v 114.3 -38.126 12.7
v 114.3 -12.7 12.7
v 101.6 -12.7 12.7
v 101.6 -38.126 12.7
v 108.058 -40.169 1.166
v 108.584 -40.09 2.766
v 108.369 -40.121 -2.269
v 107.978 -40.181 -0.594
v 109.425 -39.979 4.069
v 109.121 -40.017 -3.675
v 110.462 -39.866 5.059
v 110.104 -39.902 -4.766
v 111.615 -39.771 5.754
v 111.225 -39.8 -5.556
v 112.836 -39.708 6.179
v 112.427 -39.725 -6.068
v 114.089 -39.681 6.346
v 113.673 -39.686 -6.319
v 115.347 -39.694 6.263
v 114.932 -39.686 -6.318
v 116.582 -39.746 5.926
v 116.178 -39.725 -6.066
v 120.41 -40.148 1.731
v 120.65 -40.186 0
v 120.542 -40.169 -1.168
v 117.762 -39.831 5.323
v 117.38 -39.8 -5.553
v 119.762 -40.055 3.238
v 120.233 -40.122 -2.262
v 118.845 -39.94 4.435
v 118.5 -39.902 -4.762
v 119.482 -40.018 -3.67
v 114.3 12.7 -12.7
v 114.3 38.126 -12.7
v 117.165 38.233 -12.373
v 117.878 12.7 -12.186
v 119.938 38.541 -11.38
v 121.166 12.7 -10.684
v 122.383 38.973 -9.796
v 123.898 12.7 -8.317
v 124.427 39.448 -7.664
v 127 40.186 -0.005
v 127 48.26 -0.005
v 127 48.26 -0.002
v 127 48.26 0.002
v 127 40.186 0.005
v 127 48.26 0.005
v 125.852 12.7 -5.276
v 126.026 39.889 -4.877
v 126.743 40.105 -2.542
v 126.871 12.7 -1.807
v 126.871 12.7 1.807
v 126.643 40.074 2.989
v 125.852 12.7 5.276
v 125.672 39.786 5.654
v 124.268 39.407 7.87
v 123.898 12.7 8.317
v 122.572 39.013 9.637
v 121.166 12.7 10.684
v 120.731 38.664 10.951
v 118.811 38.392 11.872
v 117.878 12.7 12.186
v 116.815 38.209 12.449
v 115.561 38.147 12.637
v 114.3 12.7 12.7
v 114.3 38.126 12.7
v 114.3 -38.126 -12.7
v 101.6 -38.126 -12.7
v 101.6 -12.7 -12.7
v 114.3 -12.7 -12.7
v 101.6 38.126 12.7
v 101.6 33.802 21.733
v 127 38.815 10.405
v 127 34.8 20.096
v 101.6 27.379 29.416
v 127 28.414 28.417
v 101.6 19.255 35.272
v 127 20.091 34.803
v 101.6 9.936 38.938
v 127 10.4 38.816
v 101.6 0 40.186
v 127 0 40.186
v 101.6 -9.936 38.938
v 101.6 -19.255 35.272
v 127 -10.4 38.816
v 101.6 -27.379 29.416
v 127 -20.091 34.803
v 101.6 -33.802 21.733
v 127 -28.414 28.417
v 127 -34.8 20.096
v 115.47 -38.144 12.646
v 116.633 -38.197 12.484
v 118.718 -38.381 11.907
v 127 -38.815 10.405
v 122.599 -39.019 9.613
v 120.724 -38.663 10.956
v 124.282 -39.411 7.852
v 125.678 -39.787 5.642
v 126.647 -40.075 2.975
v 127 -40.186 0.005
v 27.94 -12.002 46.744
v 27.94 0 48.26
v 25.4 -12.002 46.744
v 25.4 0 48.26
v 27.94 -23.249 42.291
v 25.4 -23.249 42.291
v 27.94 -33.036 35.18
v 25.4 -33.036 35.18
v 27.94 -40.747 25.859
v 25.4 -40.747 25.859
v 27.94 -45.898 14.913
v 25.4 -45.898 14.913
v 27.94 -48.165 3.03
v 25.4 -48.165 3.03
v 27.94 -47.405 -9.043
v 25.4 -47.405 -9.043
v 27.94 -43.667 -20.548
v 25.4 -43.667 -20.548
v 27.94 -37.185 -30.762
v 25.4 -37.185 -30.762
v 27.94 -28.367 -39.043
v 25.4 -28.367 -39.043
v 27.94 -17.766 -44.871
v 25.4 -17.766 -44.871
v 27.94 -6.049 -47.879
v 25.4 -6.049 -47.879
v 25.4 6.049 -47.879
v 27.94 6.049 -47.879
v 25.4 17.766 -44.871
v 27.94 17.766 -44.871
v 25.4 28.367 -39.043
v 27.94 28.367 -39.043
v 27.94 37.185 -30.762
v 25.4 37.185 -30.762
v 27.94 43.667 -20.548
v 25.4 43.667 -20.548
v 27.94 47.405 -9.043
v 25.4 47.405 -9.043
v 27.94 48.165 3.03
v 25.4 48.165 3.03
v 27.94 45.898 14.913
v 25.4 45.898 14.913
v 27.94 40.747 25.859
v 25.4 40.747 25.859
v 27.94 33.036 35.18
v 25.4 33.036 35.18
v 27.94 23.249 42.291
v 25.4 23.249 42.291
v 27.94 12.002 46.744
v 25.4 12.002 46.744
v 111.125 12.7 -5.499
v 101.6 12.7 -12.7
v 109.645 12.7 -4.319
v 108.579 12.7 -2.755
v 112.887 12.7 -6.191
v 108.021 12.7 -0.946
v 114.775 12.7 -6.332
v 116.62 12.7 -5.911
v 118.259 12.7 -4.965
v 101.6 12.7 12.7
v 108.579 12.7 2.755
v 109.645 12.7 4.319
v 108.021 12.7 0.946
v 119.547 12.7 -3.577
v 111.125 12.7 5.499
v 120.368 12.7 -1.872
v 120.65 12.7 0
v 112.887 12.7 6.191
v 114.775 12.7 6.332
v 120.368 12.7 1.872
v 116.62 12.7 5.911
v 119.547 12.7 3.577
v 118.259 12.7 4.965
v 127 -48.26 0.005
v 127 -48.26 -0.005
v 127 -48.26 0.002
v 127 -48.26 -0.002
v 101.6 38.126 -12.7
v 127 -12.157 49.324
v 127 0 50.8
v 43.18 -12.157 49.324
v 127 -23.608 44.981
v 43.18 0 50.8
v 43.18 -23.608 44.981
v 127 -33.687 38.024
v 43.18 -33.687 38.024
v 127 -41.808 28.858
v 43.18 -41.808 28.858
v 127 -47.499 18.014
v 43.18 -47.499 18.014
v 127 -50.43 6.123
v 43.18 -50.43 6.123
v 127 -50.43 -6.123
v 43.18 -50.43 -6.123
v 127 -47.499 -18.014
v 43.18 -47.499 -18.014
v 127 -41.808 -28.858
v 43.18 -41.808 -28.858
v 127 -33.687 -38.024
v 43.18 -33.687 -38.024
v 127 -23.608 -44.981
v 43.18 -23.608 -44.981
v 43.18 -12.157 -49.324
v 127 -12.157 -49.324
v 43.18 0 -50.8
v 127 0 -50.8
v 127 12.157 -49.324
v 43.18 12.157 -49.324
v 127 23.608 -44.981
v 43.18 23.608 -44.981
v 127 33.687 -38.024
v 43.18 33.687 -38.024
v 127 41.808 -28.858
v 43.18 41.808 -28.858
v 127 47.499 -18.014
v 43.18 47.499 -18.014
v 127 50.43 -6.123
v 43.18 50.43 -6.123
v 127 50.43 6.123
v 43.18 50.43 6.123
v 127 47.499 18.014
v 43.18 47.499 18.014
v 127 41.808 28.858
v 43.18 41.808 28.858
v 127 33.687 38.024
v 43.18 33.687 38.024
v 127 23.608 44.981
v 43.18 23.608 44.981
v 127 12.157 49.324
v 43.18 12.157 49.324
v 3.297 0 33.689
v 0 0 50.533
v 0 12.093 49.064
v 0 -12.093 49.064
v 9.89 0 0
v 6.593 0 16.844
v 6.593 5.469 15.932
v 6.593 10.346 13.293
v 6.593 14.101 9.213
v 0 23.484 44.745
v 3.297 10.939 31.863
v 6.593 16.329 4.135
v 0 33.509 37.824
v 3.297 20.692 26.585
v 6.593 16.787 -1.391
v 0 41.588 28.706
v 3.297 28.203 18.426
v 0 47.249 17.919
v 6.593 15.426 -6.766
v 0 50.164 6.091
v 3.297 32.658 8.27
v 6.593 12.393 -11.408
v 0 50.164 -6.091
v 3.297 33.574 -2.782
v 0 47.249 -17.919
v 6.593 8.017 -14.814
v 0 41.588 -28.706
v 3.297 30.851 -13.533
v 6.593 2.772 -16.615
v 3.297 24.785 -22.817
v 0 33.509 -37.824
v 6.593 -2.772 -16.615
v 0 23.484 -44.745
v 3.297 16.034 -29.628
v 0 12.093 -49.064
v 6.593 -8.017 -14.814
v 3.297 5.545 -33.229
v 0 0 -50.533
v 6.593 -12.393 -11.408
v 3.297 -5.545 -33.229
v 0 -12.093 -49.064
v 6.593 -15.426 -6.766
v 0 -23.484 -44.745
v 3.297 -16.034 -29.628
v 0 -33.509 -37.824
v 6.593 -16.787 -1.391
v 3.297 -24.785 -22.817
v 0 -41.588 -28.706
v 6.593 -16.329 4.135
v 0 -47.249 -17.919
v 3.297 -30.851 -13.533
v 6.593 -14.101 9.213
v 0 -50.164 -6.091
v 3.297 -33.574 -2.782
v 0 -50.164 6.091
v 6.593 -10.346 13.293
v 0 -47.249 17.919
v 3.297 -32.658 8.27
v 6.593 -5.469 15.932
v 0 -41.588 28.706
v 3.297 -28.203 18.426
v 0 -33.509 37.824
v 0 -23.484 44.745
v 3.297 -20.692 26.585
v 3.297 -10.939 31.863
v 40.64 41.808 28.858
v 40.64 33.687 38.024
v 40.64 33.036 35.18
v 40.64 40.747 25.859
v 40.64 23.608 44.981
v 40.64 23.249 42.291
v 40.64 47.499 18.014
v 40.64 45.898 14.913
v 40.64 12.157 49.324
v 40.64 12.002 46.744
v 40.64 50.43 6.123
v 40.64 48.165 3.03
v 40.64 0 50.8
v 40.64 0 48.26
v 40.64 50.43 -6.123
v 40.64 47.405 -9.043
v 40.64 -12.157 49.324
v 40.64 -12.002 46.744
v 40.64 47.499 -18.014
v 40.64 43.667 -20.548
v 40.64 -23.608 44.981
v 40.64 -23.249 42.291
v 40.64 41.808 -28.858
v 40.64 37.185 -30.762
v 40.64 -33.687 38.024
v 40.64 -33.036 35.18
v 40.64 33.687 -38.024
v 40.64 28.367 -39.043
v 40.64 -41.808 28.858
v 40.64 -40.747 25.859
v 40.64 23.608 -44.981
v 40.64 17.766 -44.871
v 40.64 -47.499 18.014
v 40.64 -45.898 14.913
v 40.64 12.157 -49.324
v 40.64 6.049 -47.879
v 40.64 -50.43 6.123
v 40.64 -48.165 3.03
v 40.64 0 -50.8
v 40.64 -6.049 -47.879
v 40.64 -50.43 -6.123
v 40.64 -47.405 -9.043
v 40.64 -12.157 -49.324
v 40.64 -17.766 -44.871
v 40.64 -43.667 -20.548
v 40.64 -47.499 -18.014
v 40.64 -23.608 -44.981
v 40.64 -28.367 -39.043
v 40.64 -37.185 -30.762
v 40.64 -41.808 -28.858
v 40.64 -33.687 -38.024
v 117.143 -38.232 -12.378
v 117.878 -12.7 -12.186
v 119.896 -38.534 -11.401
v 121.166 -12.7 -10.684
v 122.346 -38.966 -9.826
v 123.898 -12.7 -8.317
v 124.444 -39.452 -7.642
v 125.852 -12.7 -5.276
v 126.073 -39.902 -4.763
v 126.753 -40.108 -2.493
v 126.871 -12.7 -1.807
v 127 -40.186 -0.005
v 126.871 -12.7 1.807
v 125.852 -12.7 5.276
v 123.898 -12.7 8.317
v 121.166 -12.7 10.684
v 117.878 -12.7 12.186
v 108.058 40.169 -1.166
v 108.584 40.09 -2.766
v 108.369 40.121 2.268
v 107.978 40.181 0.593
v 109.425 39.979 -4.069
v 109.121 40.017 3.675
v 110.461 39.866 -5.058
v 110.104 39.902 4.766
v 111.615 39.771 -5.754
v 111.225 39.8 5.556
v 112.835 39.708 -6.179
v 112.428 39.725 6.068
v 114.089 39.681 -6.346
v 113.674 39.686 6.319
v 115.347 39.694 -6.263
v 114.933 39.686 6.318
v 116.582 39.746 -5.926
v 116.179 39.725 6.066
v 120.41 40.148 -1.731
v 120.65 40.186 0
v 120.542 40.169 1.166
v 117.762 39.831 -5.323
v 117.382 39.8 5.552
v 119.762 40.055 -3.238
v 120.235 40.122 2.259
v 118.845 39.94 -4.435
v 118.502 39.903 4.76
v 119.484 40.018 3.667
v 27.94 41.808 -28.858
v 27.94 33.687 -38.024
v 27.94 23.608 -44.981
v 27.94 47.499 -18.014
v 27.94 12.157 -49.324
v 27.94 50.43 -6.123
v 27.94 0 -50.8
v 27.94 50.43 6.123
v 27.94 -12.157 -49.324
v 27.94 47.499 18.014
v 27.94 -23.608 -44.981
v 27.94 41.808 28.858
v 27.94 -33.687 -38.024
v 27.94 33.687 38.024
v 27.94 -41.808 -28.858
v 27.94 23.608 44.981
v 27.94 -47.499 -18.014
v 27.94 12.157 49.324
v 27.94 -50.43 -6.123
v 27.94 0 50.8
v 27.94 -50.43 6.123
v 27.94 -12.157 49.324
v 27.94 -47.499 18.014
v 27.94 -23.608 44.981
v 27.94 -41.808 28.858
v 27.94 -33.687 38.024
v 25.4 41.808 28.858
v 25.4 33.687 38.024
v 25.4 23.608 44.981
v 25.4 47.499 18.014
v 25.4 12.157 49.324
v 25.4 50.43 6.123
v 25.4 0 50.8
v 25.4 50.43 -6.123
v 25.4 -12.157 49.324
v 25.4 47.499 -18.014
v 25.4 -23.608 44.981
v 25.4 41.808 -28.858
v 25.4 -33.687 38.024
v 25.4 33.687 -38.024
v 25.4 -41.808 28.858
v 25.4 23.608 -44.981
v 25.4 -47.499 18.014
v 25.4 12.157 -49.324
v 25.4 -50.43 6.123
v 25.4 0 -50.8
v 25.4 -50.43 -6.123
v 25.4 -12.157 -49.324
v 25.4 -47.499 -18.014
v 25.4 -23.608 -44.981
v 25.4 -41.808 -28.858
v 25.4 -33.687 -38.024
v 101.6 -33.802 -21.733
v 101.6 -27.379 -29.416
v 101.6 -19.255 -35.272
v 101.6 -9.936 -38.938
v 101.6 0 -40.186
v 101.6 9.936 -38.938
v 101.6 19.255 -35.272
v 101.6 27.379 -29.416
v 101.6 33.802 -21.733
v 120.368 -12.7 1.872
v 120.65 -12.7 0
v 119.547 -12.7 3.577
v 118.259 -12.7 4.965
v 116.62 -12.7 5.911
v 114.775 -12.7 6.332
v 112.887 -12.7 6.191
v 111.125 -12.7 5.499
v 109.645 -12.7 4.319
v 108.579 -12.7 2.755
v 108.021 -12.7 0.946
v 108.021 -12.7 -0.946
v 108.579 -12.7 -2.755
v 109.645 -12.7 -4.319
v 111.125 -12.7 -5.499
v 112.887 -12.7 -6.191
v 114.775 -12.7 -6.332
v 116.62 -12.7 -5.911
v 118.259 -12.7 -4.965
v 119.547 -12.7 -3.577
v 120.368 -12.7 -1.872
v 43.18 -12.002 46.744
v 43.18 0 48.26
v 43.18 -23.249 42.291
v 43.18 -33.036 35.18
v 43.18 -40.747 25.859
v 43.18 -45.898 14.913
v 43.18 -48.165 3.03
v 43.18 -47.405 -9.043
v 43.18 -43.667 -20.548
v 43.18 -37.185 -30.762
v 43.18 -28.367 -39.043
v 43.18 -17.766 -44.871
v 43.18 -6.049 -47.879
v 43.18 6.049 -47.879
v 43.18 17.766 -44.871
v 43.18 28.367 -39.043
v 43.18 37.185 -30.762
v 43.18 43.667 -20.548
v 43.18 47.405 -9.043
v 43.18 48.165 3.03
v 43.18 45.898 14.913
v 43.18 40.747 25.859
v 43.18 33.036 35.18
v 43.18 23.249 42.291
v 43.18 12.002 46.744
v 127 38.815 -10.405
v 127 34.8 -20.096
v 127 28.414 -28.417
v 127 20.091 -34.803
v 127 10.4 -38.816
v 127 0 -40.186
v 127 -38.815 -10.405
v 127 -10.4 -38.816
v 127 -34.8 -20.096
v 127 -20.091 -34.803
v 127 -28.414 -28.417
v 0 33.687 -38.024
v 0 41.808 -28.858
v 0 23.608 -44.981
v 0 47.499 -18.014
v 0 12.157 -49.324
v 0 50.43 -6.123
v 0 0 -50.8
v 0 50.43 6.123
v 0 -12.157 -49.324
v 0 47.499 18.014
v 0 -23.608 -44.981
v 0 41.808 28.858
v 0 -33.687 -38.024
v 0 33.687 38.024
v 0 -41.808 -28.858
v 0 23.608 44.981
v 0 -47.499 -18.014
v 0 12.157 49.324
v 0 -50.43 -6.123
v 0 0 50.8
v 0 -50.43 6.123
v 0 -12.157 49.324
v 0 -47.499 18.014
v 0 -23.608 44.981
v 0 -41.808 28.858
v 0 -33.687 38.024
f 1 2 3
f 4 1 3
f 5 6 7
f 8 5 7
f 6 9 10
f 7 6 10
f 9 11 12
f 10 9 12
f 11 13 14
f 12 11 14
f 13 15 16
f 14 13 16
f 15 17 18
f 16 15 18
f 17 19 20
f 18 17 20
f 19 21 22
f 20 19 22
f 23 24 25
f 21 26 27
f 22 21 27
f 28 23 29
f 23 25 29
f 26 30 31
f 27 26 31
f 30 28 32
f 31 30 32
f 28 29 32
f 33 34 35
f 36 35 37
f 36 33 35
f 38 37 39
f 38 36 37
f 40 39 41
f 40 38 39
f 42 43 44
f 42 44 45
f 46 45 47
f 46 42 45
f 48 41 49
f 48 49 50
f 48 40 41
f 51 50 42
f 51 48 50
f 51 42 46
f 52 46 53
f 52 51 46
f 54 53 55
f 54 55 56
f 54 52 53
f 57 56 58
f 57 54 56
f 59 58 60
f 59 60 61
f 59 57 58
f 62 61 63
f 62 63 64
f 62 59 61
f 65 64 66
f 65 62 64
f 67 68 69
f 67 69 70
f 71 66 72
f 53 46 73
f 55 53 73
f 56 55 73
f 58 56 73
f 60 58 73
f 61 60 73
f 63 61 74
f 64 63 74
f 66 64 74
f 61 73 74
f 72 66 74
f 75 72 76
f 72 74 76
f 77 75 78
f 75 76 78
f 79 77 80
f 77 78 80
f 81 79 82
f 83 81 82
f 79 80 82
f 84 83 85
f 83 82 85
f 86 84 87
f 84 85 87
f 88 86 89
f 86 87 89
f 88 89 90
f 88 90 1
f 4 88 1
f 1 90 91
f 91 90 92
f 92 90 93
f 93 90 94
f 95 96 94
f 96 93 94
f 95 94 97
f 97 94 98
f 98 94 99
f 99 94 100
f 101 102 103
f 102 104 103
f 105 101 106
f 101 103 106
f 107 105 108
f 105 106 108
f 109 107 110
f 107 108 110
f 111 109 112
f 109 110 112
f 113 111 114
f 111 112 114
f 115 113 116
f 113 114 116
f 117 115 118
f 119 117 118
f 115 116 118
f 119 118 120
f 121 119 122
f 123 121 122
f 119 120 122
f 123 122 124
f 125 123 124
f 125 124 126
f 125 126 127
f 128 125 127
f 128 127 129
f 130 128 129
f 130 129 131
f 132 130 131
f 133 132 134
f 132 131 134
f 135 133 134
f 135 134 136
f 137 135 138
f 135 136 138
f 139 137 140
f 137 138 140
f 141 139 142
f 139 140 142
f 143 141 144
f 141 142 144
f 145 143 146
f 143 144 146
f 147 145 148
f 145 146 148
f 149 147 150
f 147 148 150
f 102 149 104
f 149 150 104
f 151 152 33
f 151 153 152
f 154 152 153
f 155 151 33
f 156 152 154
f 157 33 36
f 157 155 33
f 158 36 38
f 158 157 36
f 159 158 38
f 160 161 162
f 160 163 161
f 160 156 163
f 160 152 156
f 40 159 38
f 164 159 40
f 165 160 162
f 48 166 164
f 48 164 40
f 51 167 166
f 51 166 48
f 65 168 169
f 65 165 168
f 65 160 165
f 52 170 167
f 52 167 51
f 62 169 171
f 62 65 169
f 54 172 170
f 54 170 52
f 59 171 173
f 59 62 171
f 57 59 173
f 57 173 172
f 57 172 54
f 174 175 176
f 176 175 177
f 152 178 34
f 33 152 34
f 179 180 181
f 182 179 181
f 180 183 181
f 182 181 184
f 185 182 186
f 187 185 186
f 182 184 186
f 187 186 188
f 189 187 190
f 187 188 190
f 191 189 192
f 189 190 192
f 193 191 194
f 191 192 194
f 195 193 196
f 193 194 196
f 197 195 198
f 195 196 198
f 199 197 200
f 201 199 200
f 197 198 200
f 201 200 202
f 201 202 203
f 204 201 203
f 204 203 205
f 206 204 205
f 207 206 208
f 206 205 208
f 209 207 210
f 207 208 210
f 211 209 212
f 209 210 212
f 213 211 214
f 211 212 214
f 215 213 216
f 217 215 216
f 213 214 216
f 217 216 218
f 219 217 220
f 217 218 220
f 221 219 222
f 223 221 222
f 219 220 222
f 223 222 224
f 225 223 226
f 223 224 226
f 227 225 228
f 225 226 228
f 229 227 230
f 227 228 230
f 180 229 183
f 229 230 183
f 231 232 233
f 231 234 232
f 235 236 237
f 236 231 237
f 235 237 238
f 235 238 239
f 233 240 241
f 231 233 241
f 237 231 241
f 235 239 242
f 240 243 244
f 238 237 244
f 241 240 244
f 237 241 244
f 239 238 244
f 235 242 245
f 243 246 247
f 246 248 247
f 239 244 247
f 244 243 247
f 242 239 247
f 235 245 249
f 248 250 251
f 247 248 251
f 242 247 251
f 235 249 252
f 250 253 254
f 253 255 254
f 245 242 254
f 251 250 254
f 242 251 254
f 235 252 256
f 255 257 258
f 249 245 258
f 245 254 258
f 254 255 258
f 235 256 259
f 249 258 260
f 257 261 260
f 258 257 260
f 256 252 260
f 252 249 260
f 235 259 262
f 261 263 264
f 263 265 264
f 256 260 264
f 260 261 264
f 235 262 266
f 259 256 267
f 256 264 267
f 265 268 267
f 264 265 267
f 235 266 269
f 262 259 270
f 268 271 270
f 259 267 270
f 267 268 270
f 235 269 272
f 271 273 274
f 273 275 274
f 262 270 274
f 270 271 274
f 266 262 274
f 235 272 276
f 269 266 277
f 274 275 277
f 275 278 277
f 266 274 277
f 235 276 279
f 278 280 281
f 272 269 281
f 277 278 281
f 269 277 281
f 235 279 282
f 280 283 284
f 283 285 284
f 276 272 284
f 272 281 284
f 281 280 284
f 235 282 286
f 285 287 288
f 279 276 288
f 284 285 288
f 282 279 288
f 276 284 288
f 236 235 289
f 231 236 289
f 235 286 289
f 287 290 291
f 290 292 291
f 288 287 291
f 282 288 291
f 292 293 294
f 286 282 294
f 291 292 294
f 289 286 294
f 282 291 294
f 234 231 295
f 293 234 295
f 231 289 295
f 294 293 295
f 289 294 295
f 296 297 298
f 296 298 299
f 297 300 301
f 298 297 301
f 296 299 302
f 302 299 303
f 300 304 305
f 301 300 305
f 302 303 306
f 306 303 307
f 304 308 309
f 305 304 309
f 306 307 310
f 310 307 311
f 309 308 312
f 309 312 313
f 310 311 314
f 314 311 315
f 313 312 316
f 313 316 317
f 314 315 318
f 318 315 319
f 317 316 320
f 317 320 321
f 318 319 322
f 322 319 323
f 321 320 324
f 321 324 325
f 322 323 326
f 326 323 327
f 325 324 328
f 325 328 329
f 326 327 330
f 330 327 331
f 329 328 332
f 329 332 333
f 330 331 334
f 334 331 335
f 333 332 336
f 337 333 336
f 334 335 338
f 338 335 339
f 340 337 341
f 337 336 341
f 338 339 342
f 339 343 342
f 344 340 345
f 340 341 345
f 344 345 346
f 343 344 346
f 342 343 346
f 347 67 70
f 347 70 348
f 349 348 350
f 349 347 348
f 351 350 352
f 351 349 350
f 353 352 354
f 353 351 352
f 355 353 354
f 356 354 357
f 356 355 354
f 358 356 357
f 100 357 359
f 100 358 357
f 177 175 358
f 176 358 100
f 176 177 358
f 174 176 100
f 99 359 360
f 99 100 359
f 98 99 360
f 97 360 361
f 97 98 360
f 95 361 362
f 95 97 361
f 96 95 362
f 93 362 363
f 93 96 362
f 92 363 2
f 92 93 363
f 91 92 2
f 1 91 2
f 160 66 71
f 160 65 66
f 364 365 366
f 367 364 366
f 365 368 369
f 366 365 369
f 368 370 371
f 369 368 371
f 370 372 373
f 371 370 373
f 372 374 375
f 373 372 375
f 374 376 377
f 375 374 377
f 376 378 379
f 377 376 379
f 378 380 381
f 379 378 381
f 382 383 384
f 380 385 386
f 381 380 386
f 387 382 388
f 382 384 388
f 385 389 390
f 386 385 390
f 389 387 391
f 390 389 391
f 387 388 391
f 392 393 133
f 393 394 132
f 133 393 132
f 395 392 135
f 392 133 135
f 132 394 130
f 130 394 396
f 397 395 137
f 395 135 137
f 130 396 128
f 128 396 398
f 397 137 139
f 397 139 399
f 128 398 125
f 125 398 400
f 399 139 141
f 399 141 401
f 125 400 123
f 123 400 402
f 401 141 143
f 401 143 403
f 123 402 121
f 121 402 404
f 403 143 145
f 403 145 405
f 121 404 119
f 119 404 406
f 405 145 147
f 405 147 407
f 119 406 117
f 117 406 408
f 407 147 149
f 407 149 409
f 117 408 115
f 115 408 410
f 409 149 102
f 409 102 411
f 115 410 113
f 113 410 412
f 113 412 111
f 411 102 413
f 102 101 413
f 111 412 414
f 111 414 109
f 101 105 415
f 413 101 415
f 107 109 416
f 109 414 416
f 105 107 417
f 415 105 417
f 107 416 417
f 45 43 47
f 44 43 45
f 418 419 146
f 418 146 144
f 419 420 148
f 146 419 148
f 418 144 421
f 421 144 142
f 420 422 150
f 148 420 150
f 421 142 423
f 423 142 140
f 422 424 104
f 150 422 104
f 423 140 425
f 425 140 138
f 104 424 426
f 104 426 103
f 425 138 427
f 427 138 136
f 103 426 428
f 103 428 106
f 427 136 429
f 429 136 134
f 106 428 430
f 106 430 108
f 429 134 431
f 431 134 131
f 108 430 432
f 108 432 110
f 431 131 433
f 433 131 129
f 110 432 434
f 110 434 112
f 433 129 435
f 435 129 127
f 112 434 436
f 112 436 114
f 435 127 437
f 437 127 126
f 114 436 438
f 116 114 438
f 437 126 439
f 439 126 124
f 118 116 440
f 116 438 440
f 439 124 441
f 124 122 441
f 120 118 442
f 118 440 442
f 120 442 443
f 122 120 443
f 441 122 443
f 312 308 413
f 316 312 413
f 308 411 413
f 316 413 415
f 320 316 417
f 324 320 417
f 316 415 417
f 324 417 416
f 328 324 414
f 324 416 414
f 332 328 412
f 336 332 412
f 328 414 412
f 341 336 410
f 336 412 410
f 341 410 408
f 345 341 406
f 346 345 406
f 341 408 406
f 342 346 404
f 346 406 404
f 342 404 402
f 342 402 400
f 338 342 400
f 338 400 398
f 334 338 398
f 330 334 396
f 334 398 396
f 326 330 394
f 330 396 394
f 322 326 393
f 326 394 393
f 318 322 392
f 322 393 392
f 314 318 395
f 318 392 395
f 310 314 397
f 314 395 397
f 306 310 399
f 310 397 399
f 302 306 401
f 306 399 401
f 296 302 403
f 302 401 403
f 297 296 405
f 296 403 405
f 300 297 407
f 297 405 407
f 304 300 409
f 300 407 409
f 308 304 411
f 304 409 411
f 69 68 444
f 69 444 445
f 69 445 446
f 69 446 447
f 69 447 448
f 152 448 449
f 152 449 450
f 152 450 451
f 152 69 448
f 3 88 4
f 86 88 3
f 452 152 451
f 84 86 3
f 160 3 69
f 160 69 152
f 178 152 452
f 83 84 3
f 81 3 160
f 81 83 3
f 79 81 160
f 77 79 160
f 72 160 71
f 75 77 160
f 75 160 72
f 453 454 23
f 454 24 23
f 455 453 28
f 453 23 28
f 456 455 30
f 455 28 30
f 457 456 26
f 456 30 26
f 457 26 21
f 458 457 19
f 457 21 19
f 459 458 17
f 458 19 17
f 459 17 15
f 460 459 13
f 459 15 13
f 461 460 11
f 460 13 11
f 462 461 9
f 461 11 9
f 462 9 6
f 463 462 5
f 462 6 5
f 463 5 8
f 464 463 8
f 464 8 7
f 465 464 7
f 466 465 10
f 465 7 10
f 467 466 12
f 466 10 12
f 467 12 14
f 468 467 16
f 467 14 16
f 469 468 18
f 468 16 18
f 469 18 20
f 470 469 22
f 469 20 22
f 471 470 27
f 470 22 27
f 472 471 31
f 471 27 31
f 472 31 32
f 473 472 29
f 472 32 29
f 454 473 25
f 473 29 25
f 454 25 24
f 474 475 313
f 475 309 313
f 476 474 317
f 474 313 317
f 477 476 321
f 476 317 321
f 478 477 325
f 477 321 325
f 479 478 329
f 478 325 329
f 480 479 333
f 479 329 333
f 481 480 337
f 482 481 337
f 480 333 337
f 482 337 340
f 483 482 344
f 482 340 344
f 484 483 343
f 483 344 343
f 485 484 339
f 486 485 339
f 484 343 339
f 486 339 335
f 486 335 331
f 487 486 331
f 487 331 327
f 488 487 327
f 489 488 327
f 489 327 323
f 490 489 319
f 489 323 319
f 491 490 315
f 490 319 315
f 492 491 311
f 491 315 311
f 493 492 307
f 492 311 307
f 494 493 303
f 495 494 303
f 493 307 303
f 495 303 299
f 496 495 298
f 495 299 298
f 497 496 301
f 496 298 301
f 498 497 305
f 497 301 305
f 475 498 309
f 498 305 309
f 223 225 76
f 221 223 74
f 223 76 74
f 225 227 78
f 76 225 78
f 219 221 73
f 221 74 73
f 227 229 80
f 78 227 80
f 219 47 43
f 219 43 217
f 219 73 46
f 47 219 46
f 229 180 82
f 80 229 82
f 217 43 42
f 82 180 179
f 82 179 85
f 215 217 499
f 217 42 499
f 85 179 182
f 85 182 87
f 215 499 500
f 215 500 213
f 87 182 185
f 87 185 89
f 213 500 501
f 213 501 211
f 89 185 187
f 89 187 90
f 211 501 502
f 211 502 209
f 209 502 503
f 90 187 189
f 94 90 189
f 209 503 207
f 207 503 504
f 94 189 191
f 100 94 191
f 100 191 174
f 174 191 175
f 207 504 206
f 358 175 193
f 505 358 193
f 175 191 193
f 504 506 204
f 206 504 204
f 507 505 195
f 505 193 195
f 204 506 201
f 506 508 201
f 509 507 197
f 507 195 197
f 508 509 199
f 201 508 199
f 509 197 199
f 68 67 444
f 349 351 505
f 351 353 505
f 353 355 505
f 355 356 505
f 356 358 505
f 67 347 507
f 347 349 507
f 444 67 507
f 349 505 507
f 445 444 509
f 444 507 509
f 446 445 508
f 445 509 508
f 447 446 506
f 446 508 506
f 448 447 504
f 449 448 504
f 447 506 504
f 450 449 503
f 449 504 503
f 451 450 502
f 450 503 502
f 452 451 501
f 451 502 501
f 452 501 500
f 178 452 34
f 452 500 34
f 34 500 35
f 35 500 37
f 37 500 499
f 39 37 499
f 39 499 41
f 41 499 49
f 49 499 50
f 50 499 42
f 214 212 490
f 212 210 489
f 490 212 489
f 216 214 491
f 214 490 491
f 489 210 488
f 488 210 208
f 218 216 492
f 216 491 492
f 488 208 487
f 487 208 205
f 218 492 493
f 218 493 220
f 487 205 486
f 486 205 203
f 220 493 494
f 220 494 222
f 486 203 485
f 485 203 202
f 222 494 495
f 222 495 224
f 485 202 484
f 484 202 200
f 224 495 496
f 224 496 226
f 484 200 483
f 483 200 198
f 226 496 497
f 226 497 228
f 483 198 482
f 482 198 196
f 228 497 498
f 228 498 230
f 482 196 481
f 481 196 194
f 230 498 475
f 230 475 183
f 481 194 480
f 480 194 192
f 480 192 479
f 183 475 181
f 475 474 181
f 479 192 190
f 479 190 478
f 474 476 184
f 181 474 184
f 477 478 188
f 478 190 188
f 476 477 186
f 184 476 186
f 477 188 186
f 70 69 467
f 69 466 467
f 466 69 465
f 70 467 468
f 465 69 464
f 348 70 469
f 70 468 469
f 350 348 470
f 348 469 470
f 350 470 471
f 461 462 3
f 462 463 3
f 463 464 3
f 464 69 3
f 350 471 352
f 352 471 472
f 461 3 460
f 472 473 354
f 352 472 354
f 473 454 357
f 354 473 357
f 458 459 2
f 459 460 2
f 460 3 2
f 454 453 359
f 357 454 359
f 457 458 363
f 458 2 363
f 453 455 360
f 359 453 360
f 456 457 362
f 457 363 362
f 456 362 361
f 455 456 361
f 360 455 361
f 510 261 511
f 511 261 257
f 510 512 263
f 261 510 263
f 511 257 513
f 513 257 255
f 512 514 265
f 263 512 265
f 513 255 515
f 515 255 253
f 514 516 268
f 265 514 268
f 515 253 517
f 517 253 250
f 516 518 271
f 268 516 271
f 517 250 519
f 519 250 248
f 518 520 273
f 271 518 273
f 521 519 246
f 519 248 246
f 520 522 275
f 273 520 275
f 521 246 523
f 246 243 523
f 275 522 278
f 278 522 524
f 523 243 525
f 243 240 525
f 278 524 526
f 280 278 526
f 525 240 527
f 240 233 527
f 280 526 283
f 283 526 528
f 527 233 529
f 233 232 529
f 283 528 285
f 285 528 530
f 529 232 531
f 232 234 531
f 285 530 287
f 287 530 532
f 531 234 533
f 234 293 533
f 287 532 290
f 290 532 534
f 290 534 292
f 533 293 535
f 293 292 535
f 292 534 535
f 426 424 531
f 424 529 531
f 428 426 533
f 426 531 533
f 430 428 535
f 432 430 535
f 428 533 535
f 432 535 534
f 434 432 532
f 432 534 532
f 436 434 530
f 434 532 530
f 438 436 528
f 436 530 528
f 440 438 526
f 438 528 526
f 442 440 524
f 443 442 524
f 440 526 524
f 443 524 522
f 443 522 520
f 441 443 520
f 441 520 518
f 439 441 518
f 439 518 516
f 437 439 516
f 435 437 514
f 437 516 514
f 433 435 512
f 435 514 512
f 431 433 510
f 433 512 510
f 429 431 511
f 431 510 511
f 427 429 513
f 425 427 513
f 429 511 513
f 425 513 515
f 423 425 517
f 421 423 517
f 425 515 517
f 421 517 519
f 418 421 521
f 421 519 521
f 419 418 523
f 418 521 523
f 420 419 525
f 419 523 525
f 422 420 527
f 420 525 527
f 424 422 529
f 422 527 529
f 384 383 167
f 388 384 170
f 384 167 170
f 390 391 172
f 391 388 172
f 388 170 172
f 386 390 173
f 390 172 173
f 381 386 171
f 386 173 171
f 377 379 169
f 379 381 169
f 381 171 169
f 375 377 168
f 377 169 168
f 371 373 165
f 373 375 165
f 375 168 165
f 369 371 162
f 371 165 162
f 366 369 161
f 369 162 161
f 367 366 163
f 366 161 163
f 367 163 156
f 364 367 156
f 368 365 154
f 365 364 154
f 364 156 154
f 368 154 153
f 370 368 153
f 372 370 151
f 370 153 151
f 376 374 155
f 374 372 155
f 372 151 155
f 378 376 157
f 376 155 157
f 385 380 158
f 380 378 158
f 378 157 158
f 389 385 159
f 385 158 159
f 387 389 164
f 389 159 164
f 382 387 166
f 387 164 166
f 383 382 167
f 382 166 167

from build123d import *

# Parameters (mm, degrees)
F2_R          = 40.1855244707
F3_DEPTH      = 25.4
F4_R          = 6.35
F5_DEPTH      = 48.26
F5_DEPTH_BACK = 48.26
F6_DEPTH      = 12.7
F6_DEPTH_BACK = 12.7


# Not quite as in the source:
# - ends of sketch curves that miss each other by under 0.0002 mm in the source are joined


with BuildPart() as f1:
    # F0 (on Front) → F1 (revolve)
    with BuildSketch(Plane.XZ):
        Polygon((0, 50.8), (0, 0), (127, 0), (127, 50.8), (43.18, 50.8), (43.18, 48.26), (40.64, 48.26), (40.64, 50.8), (27.94, 50.8), (27.94, 48.26), (25.4, 48.26), (25.4, 50.8), align=None)
    revolve(axis=Axis((-13.3472196758, 0, 0), (1, 0, 0)))

    # F2 (on face) → F3 (cut)
    with BuildSketch(Plane.YZ.offset(127)):
        Circle(F2_R)
    extrude(amount=-F3_DEPTH, mode=Mode.SUBTRACT)

    # F4 (on Front) → F5 (join, two sides)
    with BuildSketch(Plane.XZ) as f5_sk:
        with BuildLine():
            Line((101.6, -12.7), (114.3, -12.7))
            ThreePointArc((114.3, -12.7), (127.0000011214, 0), (114.3, 12.7000011214))
            Line((114.3, 12.7000011214), (101.6, 12.7))
            Line((101.6, 12.7), (101.6, -12.7))
        make_face()
        with Locations((114.3, 0)):
            Circle(F4_R, mode=Mode.SUBTRACT)
    extrude(amount=F5_DEPTH)
    extrude(f5_sk.sketch, amount=-F5_DEPTH_BACK)

    # F4 (on Front) → F6 (cut, two sides)
    with BuildSketch(Plane.XZ) as f6_sk:
        with BuildLine():
            Line((101.6, -12.7), (114.3, -12.7))
            ThreePointArc((114.3, -12.7), (127.0000011214, 0), (114.3, 12.7000011214))
            Line((114.3, 12.7000011214), (101.6, 12.7))
            Line((101.6, 12.7), (101.6, -12.7))
        make_face()
        with Locations((114.3, 0)):
            Circle(F4_R, mode=Mode.SUBTRACT)
    extrude(amount=-F6_DEPTH, mode=Mode.SUBTRACT)
    extrude(f6_sk.sketch, amount=F6_DEPTH_BACK, mode=Mode.SUBTRACT)

    # F7 (on Front) → F8 (revolve, cut)
    with BuildSketch(Plane.XZ):
        Polygon((0, 50.5328811705), (0, 0), (9.8897889256, 0), align=None)
    revolve(axis=Axis((4.9448944628, 0, 0), (-1, 0, 0)), mode=Mode.SUBTRACT)


solid = f1.part
